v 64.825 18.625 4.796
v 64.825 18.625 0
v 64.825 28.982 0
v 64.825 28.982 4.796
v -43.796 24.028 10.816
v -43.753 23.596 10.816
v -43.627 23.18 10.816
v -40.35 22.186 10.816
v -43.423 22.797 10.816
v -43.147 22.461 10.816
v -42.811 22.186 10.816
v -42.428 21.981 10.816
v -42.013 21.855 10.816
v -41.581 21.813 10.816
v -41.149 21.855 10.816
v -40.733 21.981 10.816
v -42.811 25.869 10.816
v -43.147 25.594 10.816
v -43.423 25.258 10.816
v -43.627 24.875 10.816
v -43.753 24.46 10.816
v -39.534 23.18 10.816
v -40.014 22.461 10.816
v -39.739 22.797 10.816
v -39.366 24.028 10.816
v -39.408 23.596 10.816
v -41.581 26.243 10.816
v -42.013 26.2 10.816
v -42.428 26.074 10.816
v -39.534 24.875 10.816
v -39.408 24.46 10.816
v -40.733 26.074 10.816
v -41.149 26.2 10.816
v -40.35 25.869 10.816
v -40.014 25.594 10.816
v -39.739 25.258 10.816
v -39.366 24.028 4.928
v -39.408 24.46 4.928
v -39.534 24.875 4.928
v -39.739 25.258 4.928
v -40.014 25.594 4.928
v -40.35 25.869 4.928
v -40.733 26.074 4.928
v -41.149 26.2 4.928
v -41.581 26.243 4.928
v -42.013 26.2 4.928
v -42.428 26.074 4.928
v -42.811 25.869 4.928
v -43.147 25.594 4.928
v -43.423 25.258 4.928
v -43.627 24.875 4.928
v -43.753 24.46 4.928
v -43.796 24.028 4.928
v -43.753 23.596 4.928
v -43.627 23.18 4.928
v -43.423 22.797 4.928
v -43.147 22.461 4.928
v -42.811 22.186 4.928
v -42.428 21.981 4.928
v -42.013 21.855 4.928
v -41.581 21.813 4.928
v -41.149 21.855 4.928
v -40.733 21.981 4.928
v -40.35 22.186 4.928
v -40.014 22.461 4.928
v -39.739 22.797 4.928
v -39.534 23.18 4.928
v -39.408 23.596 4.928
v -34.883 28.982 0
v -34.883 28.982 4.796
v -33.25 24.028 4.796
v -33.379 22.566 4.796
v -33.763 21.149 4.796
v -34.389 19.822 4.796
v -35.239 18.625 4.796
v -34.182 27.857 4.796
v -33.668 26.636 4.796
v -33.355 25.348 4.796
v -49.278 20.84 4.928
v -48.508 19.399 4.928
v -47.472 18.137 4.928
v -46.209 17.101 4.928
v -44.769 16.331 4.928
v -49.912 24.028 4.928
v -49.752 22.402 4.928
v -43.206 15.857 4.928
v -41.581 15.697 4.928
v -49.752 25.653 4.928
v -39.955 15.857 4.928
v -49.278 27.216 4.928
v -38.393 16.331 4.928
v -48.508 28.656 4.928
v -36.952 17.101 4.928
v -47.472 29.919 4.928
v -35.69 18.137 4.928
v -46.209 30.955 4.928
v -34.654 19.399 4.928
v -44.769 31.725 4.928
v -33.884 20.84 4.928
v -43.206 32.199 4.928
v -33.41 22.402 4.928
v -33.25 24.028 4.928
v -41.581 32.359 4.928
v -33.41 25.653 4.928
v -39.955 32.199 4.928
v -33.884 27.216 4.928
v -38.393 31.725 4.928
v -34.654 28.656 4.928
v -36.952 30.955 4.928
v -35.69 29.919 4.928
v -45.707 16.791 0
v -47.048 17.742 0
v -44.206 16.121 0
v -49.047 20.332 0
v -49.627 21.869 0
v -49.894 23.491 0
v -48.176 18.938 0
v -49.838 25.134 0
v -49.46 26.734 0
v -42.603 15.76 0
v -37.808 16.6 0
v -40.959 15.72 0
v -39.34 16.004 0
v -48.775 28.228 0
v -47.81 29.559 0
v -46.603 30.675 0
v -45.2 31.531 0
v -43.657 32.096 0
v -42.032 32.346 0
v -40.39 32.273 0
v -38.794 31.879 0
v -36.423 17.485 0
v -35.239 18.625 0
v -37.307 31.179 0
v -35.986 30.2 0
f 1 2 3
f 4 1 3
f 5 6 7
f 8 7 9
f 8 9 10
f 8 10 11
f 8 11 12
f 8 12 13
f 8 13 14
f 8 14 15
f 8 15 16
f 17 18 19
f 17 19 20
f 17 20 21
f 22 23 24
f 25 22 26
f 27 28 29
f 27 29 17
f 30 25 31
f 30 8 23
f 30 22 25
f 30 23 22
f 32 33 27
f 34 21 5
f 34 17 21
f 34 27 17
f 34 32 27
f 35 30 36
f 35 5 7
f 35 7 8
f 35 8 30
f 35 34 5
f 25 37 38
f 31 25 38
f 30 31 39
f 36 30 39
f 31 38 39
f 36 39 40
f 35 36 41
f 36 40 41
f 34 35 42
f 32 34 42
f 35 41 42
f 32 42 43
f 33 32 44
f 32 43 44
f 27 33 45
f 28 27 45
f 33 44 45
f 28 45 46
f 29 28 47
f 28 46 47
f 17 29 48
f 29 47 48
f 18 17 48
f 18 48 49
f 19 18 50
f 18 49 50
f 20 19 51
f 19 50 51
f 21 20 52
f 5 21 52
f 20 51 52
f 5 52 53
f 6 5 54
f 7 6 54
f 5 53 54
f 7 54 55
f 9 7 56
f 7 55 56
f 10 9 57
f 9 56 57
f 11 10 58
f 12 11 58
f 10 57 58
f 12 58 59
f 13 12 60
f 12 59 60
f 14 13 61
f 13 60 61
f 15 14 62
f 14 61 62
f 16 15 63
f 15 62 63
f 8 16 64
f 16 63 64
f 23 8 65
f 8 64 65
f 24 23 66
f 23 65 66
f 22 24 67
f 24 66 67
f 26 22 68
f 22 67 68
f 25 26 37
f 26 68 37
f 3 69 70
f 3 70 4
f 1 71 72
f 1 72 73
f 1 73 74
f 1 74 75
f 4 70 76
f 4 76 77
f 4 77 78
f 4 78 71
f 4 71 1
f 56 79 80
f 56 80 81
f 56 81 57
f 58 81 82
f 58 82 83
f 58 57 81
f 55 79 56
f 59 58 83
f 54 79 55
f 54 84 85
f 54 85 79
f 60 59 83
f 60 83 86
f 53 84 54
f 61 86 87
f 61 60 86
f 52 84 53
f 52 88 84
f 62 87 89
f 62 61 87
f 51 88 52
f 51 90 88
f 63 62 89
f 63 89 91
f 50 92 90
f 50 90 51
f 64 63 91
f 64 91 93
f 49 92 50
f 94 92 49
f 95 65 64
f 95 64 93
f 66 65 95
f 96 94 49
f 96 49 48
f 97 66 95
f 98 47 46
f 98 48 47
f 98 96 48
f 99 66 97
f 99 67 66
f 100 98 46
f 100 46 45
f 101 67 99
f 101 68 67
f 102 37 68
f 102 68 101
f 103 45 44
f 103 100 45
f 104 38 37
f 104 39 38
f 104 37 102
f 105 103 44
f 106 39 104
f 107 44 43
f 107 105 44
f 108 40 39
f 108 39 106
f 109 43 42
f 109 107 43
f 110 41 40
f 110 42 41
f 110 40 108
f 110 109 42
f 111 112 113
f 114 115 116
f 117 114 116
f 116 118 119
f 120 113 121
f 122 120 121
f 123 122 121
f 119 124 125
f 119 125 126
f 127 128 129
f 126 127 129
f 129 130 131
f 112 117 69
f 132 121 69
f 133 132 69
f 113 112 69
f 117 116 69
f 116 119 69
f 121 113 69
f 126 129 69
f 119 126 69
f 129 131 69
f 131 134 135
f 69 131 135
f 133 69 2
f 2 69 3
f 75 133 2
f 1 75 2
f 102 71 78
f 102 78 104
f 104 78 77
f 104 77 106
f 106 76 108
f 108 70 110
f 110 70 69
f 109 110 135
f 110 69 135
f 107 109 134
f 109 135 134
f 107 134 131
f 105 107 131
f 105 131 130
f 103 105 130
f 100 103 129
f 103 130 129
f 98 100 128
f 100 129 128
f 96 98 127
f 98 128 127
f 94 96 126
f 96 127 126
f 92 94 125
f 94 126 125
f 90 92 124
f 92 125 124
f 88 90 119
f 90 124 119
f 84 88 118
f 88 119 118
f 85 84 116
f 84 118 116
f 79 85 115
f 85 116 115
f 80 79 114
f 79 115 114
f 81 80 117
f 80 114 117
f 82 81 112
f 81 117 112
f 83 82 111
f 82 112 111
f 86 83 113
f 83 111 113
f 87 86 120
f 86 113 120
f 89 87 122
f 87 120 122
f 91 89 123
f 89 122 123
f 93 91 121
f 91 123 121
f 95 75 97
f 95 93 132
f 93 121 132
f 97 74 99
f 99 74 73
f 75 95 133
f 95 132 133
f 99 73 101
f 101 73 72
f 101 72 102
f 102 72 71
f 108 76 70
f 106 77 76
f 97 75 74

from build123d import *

# Parameters (mm, degrees)
F0_W     = 103.720352
F0_H     = 10.356933
F1_DEPTH = 4.796078
F2_R     = 8.331013
F3_DEPTH = 4.927844
F4_R     = 2.215122
F5_DEPTH = 5.888587


with BuildPart() as f1:
    # F0 (on Top) → F1 (new body)
    with BuildSketch(Plane.XY):
        with Locations((12.965046, 23.803338)):
            Rectangle(F0_W, F0_H)
    extrude(amount=F1_DEPTH)

    # F2 (on Top) → F3 (join)
    with BuildSketch(Plane.XY):
        with Locations((-41.580703, 24.02766)):
            Circle(F2_R)
    extrude(amount=F3_DEPTH)

    # F4 (on face) → F5 (join)
    with BuildSketch(Plane.XY.offset(4.927844)):
        with Locations((-41.580703, 24.02766)):
            Circle(F4_R)
    extrude(amount=F5_DEPTH)


solid = f1.part
